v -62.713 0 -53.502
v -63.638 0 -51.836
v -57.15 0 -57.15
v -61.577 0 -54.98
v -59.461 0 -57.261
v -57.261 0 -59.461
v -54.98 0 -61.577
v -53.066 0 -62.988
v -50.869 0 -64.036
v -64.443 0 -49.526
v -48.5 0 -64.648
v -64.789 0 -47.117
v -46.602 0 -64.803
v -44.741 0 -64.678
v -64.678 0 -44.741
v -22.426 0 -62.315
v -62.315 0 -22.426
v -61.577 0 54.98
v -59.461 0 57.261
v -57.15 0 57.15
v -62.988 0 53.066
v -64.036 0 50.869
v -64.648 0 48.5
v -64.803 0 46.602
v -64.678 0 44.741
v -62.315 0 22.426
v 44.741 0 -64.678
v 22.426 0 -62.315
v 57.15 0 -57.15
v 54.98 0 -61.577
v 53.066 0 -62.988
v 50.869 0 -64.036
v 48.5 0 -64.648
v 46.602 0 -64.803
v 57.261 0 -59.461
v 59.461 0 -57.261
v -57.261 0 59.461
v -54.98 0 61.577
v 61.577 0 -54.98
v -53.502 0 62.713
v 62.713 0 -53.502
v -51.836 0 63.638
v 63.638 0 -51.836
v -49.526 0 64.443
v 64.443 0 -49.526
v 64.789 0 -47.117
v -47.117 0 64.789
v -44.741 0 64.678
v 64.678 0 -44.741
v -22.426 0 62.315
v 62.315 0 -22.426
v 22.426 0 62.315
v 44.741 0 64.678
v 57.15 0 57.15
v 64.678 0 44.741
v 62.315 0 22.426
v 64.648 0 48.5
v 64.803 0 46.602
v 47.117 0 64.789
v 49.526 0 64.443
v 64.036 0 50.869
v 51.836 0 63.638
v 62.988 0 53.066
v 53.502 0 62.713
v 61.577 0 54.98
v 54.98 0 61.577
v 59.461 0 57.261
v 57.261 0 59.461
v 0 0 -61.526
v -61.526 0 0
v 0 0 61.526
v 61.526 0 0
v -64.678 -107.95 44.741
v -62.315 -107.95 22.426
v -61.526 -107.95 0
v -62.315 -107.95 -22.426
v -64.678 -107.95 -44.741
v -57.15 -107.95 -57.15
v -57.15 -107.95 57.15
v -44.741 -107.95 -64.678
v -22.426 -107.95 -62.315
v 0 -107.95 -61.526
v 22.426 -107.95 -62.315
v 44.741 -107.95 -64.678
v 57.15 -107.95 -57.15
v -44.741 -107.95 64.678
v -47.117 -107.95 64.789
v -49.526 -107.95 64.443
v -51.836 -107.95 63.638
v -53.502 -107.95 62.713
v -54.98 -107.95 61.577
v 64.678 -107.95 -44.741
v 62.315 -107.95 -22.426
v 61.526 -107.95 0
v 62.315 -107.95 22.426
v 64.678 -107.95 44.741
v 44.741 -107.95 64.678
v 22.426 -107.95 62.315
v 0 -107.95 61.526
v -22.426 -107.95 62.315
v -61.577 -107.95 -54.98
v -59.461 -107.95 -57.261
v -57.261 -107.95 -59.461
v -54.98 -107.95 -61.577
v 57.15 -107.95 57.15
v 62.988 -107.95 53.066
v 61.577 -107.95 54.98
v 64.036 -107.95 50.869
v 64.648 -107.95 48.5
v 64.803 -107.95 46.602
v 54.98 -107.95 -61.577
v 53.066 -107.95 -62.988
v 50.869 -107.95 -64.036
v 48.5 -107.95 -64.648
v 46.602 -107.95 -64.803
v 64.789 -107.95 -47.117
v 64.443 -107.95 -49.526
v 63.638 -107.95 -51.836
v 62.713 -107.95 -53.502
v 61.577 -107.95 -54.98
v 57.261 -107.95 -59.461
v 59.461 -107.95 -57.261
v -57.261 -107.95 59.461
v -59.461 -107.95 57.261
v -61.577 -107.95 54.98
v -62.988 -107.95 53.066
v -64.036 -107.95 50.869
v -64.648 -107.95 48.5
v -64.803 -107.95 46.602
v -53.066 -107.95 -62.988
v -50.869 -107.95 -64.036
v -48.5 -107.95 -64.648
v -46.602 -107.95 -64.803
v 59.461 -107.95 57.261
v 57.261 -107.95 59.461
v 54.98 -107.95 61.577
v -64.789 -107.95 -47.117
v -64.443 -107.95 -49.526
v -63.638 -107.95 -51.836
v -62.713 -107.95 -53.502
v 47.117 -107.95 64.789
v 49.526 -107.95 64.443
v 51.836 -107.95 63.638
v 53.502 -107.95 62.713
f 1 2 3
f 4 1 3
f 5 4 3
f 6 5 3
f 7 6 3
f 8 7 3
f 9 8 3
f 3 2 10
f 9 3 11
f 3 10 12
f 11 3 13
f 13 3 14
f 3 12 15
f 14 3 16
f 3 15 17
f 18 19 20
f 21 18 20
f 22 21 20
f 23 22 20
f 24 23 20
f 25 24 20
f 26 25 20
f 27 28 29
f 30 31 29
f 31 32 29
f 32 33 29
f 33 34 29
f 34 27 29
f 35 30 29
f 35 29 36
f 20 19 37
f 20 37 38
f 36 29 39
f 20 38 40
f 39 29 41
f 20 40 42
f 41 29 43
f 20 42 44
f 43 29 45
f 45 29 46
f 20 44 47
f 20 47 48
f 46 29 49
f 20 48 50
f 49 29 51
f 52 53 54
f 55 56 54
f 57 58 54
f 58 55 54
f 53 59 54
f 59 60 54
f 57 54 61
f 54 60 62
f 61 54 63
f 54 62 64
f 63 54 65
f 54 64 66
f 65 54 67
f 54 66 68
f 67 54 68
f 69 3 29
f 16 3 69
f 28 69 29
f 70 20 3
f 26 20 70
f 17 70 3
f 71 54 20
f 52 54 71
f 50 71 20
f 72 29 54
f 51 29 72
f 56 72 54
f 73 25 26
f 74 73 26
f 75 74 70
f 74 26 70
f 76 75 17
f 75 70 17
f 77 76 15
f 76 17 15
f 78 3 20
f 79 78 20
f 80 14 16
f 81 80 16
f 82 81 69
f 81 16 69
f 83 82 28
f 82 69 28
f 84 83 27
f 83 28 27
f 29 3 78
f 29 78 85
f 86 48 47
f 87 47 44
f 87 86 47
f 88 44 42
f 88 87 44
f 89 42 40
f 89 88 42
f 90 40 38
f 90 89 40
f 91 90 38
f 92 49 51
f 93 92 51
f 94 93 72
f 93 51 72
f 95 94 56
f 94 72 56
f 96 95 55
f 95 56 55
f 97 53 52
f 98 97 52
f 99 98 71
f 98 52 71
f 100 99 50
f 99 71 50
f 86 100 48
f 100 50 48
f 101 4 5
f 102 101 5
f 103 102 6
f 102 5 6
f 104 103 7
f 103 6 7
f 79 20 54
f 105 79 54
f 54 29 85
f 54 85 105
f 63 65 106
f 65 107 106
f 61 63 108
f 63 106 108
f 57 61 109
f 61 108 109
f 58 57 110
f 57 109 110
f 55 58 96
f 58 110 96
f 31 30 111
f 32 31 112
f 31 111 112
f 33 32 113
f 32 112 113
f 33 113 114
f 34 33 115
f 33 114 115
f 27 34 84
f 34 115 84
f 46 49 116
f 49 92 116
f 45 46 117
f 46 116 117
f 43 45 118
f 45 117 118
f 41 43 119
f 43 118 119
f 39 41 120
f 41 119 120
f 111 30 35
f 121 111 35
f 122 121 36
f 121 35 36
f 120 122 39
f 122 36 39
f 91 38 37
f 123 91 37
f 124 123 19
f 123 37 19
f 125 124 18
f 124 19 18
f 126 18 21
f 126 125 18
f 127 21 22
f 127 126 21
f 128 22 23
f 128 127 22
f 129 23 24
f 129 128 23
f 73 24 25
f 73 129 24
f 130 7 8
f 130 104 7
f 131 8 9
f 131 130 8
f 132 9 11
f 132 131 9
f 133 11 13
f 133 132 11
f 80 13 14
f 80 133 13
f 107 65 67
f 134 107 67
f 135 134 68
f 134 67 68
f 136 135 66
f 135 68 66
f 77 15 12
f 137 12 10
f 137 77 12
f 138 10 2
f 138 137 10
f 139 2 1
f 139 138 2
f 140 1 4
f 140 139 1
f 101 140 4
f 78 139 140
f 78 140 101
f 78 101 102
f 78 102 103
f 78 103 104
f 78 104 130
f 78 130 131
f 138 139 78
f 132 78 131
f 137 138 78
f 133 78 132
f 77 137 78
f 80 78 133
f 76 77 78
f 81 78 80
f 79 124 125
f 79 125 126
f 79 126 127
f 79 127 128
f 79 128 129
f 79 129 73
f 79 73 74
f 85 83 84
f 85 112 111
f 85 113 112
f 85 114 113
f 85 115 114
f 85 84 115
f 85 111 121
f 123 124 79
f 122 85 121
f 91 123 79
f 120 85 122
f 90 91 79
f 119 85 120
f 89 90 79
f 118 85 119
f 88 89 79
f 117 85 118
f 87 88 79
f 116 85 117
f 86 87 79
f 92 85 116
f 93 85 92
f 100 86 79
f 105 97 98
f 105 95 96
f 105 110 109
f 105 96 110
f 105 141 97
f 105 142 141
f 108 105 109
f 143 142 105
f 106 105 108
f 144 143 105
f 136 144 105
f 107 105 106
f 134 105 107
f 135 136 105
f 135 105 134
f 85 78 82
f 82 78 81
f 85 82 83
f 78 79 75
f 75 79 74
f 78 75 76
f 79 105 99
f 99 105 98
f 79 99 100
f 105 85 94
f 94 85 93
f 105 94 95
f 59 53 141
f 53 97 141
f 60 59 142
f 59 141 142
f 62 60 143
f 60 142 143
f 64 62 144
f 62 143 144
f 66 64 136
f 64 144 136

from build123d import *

# Parameters (mm, degrees)
F0_W     = 114.3
F0_H     = 114.3
F1_DEPTH = 107.95
F2_R     = 12.7


with BuildPart() as f1:
    # F0 (on Front) → F1 (new body)
    with BuildSketch(Plane.XZ):
        with BuildLine():
            ThreePointArc((50.235812, 65.5047), (0, 61.526428), (-50.235812, 65.5047))
            ThreePointArc((-50.235812, 65.5047), (-58.371665, 58.371665), (-65.5047, 50.235812))
            ThreePointArc((-65.5047, 50.235812), (-61.526428, 0), (-65.5047, -50.235812))
            ThreePointArc((-65.5047, -50.235812), (-58.371665, -58.371665), (-50.235812, -65.5047))
            ThreePointArc((-50.235812, -65.5047), (0, -61.526428), (50.235812, -65.5047))
            ThreePointArc((50.235812, -65.5047), (58.371665, -58.371665), (65.5047, -50.235812))
            ThreePointArc((65.5047, -50.235812), (61.526428, 0), (65.5047, 50.235812))
            ThreePointArc((65.5047, 50.235812), (58.371665, 58.371665), (50.235812, 65.5047))
        make_face()
        Rectangle(F0_W, F0_H, mode=Mode.SUBTRACT)
    extrude(amount=F1_DEPTH)

    # F2
    f2_edges = [f1.edges().sort_by_distance(p)[0] for p in [
        (-65.5047, -53.975, 50.235812),
        (-50.235812, -53.975, 65.5047),
        (50.235812, -53.975, 65.5047),
        (65.5047, -53.975, 50.235812),
        (50.235812, -53.975, -65.5047),
        (65.5047, -53.975, -50.235812),
        (-50.235812, -53.975, -65.5047),
        (-65.5047, -53.975, -50.235812),
    ]]
    fillet(f2_edges, radius=F2_R)


solid = f1.part
